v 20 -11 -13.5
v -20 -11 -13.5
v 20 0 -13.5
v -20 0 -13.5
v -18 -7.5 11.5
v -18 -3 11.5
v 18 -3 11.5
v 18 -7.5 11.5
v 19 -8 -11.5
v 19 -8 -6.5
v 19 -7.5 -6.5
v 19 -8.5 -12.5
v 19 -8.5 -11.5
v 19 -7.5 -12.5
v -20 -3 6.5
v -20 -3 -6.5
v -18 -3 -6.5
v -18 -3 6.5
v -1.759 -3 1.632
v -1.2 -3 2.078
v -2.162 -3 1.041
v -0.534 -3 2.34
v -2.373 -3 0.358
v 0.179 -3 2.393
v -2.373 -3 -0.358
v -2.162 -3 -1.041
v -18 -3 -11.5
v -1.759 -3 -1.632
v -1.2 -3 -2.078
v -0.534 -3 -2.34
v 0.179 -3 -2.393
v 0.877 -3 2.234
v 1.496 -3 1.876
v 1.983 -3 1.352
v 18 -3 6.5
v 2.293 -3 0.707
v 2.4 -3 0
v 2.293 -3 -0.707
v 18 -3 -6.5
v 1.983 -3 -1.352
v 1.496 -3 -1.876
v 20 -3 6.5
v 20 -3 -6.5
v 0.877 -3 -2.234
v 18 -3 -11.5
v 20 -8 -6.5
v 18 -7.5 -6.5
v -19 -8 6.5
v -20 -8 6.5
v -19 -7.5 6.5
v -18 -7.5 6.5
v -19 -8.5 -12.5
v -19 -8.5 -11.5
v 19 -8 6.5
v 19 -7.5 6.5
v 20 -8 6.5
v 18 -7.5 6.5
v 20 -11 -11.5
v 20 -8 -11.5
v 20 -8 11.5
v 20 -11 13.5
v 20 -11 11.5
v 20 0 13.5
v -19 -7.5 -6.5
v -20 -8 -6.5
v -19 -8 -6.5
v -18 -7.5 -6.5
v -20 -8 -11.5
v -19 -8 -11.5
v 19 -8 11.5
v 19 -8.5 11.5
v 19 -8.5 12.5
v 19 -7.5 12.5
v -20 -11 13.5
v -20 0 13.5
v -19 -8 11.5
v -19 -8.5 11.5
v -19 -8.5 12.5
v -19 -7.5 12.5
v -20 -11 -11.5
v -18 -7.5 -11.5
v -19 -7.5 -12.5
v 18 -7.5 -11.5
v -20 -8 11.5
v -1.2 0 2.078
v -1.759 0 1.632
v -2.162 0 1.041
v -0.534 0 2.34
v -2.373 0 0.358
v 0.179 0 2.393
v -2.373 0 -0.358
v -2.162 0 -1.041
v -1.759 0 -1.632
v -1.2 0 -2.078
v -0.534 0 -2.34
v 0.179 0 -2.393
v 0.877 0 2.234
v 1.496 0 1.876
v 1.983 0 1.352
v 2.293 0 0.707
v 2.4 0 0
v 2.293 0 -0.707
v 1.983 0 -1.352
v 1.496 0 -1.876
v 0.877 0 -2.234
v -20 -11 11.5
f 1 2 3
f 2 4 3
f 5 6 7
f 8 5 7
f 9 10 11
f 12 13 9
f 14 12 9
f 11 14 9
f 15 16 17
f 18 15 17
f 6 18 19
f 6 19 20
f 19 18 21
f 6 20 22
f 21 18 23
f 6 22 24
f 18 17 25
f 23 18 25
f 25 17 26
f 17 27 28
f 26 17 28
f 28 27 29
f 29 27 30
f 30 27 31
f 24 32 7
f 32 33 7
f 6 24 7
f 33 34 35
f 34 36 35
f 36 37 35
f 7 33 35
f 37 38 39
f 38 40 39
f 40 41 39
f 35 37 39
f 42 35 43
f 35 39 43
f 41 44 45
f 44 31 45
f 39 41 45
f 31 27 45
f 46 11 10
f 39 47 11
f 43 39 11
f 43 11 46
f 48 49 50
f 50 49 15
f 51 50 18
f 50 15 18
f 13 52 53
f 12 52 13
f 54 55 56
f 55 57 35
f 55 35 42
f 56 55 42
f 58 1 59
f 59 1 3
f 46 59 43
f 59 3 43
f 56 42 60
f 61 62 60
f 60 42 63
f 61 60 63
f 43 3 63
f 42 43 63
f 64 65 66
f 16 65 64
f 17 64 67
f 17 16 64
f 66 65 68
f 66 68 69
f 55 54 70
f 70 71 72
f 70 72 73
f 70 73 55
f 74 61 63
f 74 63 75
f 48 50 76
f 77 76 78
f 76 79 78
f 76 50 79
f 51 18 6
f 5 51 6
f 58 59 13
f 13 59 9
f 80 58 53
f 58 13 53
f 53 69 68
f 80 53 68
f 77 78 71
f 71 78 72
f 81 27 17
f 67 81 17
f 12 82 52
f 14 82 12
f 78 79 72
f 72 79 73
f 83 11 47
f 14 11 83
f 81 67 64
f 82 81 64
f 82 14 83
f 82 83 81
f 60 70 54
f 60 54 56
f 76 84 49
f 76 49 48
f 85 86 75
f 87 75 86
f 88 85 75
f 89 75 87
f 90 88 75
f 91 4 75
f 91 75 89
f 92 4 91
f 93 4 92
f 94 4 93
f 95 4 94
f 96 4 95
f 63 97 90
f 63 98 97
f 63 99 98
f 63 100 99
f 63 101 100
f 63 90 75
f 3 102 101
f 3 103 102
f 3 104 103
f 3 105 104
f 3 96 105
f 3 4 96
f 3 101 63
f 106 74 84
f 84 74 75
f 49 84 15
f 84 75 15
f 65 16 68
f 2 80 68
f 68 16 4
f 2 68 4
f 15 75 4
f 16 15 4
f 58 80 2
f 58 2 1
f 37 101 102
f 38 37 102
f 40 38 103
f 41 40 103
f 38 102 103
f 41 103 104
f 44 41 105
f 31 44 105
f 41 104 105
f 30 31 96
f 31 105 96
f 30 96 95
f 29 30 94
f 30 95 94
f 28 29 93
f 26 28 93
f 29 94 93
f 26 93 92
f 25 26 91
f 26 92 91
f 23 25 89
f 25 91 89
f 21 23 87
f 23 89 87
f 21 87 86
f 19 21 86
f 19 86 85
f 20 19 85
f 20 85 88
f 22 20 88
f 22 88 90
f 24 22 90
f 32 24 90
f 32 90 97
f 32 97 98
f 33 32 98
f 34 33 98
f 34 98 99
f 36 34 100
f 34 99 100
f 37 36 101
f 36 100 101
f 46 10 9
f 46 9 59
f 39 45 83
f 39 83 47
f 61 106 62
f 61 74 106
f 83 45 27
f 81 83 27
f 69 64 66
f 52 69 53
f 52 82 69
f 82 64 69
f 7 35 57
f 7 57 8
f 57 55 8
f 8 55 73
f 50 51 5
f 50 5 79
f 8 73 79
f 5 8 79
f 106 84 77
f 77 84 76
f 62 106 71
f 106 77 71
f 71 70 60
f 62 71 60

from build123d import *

# Parameters (mm, degrees)
SKETCH3_W           = 40
SKETCH3_H           = 40
SKETCH3_R           = 5
SKETCH3_R_2         = 2.4
BOSS_EXTRUDE2_DEPTH = 3
BOSS_EXTRUDE3_DEPTH = 8
SKETCH6_W           = 2
SKETCH6_H           = 5
BOSS_EXTRUDE5_DEPTH = 5
SKETCH7_W           = 40
SKETCH7_H           = 6.5
CUT_EXTRUDE1_DEPTH  = 3
SKETCH8_W           = 40
SKETCH8_H           = 6.5
CUT_EXTRUDE2_DEPTH  = 3
CUT_EXTRUDE3_START  = -1
SKETCH5_W           = 5
SKETCH5_H           = 0.5
CUT_EXTRUDE3_DEPTH  = 6


with BuildPart() as part:
    # Sketch3 → Boss-Extrude2 (new body)
    with BuildSketch(Plane(origin=(0, 0, 0), x_dir=(1, 0, 0), z_dir=(0, 1, 0))):
        Rectangle(SKETCH3_W, SKETCH3_H)
        Circle(SKETCH3_R, mode=Mode.SUBTRACT)
        Circle(SKETCH3_R)
        Circle(SKETCH3_R_2, mode=Mode.SUBTRACT)
    extrude(amount=-BOSS_EXTRUDE2_DEPTH)

    # Sketch4 → Boss-Extrude3 (add)
    with BuildSketch(Plane.XZ.offset(3)):
        Polygon((20, -11.5), (0, -11.5), (-20, -11.5), (-20, -13.5), (20, -13.5), align=None)
        Polygon((-20, 11.5), (0, 11.5), (20, 11.5), (20, 13.5), (-20, 13.5), align=None)
    extrude(amount=BOSS_EXTRUDE3_DEPTH)

    # Sketch6 → Boss-Extrude5 (add)
    with BuildSketch(Plane.XZ.offset(3)):
        with Locations((19, 9)):
            Rectangle(SKETCH6_W, SKETCH6_H)
        with Locations((19, -9)):
            Rectangle(SKETCH6_W, SKETCH6_H)
        with Locations((-19, -9)):
            Rectangle(SKETCH6_W, SKETCH6_H)
        with Locations((-19, 9)):
            Rectangle(SKETCH6_W, SKETCH6_H)
    extrude(amount=BOSS_EXTRUDE5_DEPTH)

    # Sketch7 → Cut-Extrude1 (cut)
    with BuildSketch(Plane(origin=(0, -3, 0), x_dir=(-1, 0, 0), z_dir=(0, -1, 0))):
        with Locations((0, -16.75)):
            Rectangle(SKETCH7_W, SKETCH7_H)
    extrude(amount=-CUT_EXTRUDE1_DEPTH, mode=Mode.SUBTRACT)

    # Sketch8 → Cut-Extrude2 (cut)
    with BuildSketch(Plane.XZ.offset(3)):
        with Locations((0, -16.75)):
            Rectangle(SKETCH8_W, SKETCH8_H)
    extrude(amount=-CUT_EXTRUDE2_DEPTH, mode=Mode.SUBTRACT)

    # Sketch5 → Cut-Extrude3 (cut)
    with BuildSketch(Plane.XY.offset(-11.5).offset(CUT_EXTRUDE3_START)):
        Polygon((19, -7.5), (0, -7.5), (0, -8), (5, -8), (5, -8.5), (19, -8.5), align=None)
        Polygon((0, -8), (0, -7.5), (-19, -7.5), (-19, -8.5), (-5, -8.5), (-5, -8), align=None)
        with Locations((-2.5, -8.25)):
            Rectangle(SKETCH5_W, SKETCH5_H)
        with Locations((2.5, -8.25)):
            Rectangle(SKETCH5_W, SKETCH5_H)
    cut_extrude3 = extrude(amount=CUT_EXTRUDE3_DEPTH, mode=Mode.SUBTRACT)

    # Mirror2: Cut-Extrude3 across plane
    add(cut_extrude3.mirror(Plane.XY), mode=Mode.SUBTRACT)


solid = part.part
